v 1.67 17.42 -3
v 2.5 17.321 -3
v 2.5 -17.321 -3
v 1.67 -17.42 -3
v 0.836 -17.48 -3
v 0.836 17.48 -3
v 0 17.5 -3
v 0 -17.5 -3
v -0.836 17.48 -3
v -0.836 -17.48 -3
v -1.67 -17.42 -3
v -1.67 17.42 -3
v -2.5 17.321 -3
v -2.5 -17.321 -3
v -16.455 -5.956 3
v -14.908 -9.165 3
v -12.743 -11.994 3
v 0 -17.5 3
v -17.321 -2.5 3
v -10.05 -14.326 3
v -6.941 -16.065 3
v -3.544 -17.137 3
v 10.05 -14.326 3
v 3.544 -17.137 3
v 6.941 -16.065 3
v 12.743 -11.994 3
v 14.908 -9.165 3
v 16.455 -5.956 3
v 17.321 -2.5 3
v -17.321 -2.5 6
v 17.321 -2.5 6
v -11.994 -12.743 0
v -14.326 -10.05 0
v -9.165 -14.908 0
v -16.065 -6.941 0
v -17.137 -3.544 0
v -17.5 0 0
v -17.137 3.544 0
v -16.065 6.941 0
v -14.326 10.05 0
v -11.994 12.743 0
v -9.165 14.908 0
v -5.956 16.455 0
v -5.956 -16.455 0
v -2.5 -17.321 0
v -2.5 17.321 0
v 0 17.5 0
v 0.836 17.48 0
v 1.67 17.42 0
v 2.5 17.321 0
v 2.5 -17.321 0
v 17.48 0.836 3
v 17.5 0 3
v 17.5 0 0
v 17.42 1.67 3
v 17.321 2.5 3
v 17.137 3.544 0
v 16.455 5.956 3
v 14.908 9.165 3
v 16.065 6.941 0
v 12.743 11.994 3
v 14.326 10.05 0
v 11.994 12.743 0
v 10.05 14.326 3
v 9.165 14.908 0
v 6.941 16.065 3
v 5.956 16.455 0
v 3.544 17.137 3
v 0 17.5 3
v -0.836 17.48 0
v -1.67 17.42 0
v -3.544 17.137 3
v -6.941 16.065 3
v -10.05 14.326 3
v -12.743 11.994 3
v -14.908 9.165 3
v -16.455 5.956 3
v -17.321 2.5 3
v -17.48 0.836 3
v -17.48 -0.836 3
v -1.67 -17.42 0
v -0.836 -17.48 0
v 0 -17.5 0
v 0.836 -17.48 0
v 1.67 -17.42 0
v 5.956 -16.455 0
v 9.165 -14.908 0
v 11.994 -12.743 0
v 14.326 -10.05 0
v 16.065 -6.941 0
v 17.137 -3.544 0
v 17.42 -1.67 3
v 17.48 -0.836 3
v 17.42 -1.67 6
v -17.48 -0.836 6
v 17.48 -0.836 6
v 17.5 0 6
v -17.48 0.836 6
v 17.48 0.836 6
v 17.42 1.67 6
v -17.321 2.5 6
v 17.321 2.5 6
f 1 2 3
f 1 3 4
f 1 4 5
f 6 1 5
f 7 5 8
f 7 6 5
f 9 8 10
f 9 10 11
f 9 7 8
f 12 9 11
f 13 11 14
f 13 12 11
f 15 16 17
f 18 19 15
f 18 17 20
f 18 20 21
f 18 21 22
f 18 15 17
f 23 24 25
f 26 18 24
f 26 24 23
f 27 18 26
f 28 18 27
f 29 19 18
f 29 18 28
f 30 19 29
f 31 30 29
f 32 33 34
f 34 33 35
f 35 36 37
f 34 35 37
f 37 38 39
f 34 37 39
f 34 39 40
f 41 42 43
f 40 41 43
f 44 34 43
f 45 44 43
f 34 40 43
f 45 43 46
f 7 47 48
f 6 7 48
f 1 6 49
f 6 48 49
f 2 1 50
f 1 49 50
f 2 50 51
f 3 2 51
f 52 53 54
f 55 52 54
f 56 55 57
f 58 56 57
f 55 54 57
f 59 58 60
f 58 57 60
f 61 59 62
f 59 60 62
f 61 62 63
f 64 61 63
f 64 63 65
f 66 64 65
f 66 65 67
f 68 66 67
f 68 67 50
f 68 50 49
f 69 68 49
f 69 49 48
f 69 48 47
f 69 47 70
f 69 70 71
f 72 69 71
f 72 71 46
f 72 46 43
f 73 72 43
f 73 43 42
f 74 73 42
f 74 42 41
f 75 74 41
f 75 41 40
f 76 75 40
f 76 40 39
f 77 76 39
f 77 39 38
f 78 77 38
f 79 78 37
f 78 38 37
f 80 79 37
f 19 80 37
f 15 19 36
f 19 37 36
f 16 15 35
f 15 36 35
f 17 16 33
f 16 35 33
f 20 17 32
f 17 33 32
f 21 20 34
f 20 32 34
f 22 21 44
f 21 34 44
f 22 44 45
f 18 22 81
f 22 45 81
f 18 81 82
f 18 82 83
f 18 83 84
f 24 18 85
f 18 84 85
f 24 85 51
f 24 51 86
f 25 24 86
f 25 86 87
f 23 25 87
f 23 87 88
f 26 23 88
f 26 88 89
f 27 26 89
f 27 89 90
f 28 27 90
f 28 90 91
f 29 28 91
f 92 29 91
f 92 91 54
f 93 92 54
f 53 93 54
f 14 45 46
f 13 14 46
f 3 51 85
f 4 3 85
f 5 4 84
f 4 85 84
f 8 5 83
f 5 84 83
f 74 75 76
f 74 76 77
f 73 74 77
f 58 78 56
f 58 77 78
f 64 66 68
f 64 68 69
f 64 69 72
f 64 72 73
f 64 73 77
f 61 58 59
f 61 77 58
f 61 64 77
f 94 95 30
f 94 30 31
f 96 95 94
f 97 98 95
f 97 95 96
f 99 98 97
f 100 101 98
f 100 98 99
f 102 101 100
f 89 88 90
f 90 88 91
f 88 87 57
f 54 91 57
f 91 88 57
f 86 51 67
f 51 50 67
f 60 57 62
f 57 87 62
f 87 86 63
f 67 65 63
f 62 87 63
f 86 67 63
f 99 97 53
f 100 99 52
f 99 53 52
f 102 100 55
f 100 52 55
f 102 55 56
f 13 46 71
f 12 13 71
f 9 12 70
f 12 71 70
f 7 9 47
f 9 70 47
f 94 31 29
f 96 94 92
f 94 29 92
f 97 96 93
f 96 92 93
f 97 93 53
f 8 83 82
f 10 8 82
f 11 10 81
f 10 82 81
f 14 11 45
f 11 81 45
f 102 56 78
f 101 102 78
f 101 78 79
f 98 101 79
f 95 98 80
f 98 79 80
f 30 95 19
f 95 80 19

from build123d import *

# Parameters (mm, degrees)
SKETCH1_R           = 17.5
BOSS_EXTRUDE1_DEPTH = 3
BOSS_EXTRUDE2_DEPTH = 3
BOSS_EXTRUDE3_DEPTH = 3


with BuildPart() as part:
    # Sketch1 → Boss-Extrude1 (new body)
    with BuildSketch(Plane.XY):
        Circle(SKETCH1_R)
    extrude(amount=BOSS_EXTRUDE1_DEPTH)

    # Sketch2 → Boss-Extrude2 (add)
    with BuildSketch(Plane.XY.offset(3)):
        with BuildLine():
            Line((0, 2.5), (-17.320508076, 2.5))
            ThreePointArc((-17.320508076, 2.5), (-17.5, 0), (-17.320508076, -2.5))
            Line((-17.320508076, -2.5), (0, -2.5))
            Line((0, -2.5), (0, 2.5))
        make_face()
        with BuildLine():
            Line((17.320508076, 2.5), (0, 2.5))
            Line((0, 2.5), (0, -2.5))
            Line((0, -2.5), (17.320508076, -2.5))
            ThreePointArc((17.320508076, -2.5), (17.45506934, -1.253217594), (17.5, 0))
            ThreePointArc((17.5, 0), (17.45506934, 1.253217594), (17.320508076, 2.5))
        make_face()
    extrude(amount=BOSS_EXTRUDE2_DEPTH)

    # Sketch3 → Boss-Extrude3 (add)
    with BuildSketch(Plane(origin=(0, 0, 0), x_dir=(-1, 0, 0), z_dir=(0, 0, -1))):
        with BuildLine():
            ThreePointArc((0, 17.5), (-1.253217594, 17.45506934), (-2.5, 17.320508076))
            Line((-2.5, 17.320508076), (-2.5, -17.320508076))
            ThreePointArc((-2.5, -17.320508076), (-1.253217594, -17.45506934), (0, -17.5))
            Line((0, -17.5), (0, 17.5))
        make_face()
        with BuildLine():
            ThreePointArc((2.5, 17.320508076), (1.253217594, 17.45506934), (0, 17.5))
            Line((0, 17.5), (0, -17.5))
            ThreePointArc((0, -17.5), (1.253217594, -17.45506934), (2.5, -17.320508076))
            Line((2.5, -17.320508076), (2.5, 17.320508076))
        make_face()
    extrude(amount=BOSS_EXTRUDE3_DEPTH)


solid = part.part
